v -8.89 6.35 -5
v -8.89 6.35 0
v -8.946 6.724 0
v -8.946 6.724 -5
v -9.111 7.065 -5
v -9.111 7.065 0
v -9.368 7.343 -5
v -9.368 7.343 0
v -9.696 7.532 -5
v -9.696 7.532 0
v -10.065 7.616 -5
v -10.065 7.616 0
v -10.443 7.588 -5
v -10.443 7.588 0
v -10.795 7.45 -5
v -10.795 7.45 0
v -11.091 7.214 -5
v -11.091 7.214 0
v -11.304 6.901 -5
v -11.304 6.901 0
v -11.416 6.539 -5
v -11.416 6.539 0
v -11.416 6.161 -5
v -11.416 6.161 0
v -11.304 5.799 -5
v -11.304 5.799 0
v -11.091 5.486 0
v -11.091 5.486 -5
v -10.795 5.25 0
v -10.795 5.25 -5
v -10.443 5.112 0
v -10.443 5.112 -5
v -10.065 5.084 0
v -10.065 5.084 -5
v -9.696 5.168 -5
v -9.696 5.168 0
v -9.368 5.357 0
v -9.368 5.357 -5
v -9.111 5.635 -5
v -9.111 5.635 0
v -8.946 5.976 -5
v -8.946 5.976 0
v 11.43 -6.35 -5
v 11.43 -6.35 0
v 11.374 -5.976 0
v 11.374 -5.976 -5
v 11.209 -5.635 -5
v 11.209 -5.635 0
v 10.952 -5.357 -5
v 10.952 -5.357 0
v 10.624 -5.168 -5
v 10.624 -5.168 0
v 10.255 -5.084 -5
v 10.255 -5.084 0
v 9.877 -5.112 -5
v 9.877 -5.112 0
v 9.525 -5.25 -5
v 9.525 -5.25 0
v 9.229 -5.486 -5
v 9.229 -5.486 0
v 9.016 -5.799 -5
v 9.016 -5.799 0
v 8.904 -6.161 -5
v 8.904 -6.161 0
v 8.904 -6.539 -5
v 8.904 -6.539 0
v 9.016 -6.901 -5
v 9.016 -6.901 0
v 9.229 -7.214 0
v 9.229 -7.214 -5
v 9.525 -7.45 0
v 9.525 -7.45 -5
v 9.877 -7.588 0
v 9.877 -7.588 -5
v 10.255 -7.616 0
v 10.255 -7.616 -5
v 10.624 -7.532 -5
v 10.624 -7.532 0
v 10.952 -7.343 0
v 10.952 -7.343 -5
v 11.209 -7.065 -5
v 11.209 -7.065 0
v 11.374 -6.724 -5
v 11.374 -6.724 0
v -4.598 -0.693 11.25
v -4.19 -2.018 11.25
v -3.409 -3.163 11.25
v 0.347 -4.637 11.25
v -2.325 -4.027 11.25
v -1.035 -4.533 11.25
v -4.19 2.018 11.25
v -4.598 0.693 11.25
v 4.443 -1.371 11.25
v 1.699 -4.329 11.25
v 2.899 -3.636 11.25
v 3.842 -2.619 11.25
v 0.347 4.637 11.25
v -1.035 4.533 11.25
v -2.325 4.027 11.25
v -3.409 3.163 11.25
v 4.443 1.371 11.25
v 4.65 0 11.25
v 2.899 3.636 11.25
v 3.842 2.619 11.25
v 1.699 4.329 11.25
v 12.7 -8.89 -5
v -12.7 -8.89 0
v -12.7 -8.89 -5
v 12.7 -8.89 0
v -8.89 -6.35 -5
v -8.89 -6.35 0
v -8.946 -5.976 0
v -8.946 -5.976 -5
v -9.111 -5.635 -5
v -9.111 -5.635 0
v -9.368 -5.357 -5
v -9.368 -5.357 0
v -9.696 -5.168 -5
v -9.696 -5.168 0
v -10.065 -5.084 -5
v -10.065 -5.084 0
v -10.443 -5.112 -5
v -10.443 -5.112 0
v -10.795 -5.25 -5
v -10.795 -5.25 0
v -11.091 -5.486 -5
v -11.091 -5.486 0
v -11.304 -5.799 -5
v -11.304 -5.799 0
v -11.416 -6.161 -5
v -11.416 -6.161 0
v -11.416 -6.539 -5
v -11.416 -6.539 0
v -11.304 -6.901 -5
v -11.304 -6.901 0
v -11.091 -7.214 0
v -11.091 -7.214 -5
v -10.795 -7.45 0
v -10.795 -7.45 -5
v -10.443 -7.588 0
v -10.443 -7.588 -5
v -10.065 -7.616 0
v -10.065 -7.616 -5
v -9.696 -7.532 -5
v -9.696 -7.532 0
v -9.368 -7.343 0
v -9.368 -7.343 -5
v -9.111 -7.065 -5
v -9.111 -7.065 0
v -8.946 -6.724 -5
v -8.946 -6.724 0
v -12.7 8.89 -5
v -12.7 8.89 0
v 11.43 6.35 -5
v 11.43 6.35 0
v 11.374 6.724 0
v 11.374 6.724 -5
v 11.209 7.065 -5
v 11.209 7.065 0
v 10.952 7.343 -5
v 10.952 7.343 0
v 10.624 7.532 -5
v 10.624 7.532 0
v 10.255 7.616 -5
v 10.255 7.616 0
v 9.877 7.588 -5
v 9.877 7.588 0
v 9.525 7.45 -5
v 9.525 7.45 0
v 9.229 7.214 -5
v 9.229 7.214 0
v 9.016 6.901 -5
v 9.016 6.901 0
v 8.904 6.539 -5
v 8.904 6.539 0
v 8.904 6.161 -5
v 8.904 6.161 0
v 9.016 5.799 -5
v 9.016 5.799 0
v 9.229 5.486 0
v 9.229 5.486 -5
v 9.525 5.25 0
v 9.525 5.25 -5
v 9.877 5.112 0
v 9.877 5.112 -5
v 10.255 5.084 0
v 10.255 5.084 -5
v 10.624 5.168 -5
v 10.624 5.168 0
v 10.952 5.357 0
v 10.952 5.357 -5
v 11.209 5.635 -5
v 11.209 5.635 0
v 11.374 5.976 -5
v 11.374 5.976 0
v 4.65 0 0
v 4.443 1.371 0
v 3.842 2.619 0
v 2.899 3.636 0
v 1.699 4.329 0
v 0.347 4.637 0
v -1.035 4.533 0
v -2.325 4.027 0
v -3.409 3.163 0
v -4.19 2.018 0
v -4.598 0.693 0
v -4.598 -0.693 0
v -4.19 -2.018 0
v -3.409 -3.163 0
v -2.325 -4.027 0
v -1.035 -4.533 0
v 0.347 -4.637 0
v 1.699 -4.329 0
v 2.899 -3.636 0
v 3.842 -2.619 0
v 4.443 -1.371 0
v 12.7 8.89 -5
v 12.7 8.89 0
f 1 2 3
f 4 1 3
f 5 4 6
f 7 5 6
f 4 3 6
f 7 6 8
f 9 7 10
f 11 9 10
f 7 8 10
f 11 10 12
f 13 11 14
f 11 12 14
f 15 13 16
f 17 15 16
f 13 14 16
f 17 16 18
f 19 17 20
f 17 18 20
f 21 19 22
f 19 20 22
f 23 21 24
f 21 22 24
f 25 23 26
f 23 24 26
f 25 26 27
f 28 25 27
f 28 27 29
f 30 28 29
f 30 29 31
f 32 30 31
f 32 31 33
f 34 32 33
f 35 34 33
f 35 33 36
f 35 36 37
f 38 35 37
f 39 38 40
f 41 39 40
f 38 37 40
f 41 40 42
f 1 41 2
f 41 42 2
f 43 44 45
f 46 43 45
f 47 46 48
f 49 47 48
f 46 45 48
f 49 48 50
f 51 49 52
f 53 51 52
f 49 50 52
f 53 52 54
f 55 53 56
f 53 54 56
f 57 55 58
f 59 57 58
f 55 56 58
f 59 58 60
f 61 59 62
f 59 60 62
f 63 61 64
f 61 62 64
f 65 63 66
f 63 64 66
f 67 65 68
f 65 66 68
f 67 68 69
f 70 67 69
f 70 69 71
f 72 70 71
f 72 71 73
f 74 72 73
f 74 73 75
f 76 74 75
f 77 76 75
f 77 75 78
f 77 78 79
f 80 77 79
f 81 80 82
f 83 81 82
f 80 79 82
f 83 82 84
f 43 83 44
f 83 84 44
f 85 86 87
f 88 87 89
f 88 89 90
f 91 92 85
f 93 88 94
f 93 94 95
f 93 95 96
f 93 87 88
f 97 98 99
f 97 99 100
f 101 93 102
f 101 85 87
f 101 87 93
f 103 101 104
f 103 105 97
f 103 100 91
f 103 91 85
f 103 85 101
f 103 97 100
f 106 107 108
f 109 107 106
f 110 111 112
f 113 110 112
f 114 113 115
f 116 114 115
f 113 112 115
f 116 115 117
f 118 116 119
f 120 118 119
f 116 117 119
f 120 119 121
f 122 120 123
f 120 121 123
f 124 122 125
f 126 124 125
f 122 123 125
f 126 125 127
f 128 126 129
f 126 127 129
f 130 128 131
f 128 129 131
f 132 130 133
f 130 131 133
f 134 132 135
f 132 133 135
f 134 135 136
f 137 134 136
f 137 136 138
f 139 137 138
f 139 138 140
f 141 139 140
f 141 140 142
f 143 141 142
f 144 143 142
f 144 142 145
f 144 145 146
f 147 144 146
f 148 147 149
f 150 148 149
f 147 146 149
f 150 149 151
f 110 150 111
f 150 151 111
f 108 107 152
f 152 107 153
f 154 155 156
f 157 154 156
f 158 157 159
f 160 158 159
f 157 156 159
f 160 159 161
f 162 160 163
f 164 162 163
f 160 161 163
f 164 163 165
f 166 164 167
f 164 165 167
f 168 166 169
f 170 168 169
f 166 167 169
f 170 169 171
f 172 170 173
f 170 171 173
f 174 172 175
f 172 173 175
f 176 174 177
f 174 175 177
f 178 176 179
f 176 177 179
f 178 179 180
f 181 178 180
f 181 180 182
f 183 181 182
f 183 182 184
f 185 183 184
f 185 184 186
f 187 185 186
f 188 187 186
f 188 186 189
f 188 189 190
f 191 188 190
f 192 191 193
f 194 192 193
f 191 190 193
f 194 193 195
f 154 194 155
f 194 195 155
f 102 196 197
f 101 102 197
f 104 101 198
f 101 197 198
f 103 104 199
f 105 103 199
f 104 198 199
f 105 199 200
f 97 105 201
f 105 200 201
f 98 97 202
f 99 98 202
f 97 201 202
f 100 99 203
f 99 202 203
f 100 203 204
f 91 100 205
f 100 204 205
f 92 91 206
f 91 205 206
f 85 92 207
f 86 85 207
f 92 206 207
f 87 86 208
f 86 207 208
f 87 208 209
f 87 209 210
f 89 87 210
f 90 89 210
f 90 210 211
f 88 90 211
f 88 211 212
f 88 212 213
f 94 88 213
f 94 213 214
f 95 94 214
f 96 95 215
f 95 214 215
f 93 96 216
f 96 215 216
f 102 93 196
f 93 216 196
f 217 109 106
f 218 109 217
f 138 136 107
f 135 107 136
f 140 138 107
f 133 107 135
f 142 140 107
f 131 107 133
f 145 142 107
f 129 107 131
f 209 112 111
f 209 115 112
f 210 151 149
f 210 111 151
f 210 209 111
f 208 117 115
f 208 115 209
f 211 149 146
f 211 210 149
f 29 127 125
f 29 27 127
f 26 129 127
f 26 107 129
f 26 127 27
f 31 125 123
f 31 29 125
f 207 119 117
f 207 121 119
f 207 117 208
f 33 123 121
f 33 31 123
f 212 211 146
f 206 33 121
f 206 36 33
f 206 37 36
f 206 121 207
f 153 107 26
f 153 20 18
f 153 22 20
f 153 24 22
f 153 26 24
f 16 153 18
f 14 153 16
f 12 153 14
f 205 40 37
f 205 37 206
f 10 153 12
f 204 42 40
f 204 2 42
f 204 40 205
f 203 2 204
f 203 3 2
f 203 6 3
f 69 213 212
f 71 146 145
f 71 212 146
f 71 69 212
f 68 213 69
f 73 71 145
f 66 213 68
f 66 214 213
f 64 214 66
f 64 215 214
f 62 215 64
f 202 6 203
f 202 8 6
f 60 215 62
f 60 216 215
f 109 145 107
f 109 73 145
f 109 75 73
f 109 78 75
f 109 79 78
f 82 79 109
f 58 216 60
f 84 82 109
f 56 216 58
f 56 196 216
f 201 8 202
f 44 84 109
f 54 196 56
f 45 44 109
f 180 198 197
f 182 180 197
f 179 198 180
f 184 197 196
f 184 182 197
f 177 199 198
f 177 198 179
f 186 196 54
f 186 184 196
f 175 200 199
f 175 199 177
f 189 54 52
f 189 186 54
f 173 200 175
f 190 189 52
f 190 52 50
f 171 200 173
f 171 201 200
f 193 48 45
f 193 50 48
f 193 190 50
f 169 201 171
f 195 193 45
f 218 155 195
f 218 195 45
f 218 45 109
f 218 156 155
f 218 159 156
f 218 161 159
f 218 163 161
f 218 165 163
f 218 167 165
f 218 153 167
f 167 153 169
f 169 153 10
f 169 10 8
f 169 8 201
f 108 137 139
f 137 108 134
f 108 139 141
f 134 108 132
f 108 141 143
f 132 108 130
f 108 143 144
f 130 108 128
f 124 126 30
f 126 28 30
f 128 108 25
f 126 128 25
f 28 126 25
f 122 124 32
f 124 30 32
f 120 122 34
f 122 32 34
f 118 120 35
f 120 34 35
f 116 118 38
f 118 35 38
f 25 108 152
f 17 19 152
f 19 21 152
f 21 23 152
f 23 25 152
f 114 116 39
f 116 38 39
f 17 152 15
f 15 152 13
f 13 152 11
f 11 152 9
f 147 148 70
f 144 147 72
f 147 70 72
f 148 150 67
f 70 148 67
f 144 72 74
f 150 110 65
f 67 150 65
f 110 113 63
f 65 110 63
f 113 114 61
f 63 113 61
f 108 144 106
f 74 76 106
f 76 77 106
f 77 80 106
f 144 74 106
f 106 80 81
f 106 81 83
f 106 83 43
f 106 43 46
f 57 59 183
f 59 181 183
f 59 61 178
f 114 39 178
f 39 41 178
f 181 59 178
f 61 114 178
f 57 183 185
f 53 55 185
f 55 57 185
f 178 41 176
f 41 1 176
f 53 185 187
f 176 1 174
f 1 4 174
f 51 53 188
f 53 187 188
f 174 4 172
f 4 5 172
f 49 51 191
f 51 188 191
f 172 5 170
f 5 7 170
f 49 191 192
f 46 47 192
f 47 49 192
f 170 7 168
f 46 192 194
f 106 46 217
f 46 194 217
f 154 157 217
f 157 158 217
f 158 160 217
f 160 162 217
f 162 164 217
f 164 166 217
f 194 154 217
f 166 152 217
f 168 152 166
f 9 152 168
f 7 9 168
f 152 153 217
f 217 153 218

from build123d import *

# Parameters (mm, degrees)
SKETCH_W     = 25.4
SKETCH_H     = 17.78
SKETCH_R     = 1.27
PAD_DEPTH    = 5
SKETCH001_R  = 4.65
PAD001_DEPTH = 11.25


with BuildPart() as part:
    # Sketch → Pad (new body)
    with BuildSketch(Plane.XY):
        Rectangle(SKETCH_W, SKETCH_H)
        with Locations((-10.16, 6.35)):
            Circle(SKETCH_R, mode=Mode.SUBTRACT)
        with Locations((10.16, 6.35)):
            Circle(SKETCH_R, mode=Mode.SUBTRACT)
        with Locations((10.16, -6.35)):
            Circle(SKETCH_R, mode=Mode.SUBTRACT)
        with Locations((-10.16, -6.35)):
            Circle(SKETCH_R, mode=Mode.SUBTRACT)
    extrude(amount=-PAD_DEPTH)

    # Sketch001 → Pad001 (join)
    with BuildSketch(Plane.XY):
        Circle(SKETCH001_R)
    extrude(amount=PAD001_DEPTH)


solid = part.part
